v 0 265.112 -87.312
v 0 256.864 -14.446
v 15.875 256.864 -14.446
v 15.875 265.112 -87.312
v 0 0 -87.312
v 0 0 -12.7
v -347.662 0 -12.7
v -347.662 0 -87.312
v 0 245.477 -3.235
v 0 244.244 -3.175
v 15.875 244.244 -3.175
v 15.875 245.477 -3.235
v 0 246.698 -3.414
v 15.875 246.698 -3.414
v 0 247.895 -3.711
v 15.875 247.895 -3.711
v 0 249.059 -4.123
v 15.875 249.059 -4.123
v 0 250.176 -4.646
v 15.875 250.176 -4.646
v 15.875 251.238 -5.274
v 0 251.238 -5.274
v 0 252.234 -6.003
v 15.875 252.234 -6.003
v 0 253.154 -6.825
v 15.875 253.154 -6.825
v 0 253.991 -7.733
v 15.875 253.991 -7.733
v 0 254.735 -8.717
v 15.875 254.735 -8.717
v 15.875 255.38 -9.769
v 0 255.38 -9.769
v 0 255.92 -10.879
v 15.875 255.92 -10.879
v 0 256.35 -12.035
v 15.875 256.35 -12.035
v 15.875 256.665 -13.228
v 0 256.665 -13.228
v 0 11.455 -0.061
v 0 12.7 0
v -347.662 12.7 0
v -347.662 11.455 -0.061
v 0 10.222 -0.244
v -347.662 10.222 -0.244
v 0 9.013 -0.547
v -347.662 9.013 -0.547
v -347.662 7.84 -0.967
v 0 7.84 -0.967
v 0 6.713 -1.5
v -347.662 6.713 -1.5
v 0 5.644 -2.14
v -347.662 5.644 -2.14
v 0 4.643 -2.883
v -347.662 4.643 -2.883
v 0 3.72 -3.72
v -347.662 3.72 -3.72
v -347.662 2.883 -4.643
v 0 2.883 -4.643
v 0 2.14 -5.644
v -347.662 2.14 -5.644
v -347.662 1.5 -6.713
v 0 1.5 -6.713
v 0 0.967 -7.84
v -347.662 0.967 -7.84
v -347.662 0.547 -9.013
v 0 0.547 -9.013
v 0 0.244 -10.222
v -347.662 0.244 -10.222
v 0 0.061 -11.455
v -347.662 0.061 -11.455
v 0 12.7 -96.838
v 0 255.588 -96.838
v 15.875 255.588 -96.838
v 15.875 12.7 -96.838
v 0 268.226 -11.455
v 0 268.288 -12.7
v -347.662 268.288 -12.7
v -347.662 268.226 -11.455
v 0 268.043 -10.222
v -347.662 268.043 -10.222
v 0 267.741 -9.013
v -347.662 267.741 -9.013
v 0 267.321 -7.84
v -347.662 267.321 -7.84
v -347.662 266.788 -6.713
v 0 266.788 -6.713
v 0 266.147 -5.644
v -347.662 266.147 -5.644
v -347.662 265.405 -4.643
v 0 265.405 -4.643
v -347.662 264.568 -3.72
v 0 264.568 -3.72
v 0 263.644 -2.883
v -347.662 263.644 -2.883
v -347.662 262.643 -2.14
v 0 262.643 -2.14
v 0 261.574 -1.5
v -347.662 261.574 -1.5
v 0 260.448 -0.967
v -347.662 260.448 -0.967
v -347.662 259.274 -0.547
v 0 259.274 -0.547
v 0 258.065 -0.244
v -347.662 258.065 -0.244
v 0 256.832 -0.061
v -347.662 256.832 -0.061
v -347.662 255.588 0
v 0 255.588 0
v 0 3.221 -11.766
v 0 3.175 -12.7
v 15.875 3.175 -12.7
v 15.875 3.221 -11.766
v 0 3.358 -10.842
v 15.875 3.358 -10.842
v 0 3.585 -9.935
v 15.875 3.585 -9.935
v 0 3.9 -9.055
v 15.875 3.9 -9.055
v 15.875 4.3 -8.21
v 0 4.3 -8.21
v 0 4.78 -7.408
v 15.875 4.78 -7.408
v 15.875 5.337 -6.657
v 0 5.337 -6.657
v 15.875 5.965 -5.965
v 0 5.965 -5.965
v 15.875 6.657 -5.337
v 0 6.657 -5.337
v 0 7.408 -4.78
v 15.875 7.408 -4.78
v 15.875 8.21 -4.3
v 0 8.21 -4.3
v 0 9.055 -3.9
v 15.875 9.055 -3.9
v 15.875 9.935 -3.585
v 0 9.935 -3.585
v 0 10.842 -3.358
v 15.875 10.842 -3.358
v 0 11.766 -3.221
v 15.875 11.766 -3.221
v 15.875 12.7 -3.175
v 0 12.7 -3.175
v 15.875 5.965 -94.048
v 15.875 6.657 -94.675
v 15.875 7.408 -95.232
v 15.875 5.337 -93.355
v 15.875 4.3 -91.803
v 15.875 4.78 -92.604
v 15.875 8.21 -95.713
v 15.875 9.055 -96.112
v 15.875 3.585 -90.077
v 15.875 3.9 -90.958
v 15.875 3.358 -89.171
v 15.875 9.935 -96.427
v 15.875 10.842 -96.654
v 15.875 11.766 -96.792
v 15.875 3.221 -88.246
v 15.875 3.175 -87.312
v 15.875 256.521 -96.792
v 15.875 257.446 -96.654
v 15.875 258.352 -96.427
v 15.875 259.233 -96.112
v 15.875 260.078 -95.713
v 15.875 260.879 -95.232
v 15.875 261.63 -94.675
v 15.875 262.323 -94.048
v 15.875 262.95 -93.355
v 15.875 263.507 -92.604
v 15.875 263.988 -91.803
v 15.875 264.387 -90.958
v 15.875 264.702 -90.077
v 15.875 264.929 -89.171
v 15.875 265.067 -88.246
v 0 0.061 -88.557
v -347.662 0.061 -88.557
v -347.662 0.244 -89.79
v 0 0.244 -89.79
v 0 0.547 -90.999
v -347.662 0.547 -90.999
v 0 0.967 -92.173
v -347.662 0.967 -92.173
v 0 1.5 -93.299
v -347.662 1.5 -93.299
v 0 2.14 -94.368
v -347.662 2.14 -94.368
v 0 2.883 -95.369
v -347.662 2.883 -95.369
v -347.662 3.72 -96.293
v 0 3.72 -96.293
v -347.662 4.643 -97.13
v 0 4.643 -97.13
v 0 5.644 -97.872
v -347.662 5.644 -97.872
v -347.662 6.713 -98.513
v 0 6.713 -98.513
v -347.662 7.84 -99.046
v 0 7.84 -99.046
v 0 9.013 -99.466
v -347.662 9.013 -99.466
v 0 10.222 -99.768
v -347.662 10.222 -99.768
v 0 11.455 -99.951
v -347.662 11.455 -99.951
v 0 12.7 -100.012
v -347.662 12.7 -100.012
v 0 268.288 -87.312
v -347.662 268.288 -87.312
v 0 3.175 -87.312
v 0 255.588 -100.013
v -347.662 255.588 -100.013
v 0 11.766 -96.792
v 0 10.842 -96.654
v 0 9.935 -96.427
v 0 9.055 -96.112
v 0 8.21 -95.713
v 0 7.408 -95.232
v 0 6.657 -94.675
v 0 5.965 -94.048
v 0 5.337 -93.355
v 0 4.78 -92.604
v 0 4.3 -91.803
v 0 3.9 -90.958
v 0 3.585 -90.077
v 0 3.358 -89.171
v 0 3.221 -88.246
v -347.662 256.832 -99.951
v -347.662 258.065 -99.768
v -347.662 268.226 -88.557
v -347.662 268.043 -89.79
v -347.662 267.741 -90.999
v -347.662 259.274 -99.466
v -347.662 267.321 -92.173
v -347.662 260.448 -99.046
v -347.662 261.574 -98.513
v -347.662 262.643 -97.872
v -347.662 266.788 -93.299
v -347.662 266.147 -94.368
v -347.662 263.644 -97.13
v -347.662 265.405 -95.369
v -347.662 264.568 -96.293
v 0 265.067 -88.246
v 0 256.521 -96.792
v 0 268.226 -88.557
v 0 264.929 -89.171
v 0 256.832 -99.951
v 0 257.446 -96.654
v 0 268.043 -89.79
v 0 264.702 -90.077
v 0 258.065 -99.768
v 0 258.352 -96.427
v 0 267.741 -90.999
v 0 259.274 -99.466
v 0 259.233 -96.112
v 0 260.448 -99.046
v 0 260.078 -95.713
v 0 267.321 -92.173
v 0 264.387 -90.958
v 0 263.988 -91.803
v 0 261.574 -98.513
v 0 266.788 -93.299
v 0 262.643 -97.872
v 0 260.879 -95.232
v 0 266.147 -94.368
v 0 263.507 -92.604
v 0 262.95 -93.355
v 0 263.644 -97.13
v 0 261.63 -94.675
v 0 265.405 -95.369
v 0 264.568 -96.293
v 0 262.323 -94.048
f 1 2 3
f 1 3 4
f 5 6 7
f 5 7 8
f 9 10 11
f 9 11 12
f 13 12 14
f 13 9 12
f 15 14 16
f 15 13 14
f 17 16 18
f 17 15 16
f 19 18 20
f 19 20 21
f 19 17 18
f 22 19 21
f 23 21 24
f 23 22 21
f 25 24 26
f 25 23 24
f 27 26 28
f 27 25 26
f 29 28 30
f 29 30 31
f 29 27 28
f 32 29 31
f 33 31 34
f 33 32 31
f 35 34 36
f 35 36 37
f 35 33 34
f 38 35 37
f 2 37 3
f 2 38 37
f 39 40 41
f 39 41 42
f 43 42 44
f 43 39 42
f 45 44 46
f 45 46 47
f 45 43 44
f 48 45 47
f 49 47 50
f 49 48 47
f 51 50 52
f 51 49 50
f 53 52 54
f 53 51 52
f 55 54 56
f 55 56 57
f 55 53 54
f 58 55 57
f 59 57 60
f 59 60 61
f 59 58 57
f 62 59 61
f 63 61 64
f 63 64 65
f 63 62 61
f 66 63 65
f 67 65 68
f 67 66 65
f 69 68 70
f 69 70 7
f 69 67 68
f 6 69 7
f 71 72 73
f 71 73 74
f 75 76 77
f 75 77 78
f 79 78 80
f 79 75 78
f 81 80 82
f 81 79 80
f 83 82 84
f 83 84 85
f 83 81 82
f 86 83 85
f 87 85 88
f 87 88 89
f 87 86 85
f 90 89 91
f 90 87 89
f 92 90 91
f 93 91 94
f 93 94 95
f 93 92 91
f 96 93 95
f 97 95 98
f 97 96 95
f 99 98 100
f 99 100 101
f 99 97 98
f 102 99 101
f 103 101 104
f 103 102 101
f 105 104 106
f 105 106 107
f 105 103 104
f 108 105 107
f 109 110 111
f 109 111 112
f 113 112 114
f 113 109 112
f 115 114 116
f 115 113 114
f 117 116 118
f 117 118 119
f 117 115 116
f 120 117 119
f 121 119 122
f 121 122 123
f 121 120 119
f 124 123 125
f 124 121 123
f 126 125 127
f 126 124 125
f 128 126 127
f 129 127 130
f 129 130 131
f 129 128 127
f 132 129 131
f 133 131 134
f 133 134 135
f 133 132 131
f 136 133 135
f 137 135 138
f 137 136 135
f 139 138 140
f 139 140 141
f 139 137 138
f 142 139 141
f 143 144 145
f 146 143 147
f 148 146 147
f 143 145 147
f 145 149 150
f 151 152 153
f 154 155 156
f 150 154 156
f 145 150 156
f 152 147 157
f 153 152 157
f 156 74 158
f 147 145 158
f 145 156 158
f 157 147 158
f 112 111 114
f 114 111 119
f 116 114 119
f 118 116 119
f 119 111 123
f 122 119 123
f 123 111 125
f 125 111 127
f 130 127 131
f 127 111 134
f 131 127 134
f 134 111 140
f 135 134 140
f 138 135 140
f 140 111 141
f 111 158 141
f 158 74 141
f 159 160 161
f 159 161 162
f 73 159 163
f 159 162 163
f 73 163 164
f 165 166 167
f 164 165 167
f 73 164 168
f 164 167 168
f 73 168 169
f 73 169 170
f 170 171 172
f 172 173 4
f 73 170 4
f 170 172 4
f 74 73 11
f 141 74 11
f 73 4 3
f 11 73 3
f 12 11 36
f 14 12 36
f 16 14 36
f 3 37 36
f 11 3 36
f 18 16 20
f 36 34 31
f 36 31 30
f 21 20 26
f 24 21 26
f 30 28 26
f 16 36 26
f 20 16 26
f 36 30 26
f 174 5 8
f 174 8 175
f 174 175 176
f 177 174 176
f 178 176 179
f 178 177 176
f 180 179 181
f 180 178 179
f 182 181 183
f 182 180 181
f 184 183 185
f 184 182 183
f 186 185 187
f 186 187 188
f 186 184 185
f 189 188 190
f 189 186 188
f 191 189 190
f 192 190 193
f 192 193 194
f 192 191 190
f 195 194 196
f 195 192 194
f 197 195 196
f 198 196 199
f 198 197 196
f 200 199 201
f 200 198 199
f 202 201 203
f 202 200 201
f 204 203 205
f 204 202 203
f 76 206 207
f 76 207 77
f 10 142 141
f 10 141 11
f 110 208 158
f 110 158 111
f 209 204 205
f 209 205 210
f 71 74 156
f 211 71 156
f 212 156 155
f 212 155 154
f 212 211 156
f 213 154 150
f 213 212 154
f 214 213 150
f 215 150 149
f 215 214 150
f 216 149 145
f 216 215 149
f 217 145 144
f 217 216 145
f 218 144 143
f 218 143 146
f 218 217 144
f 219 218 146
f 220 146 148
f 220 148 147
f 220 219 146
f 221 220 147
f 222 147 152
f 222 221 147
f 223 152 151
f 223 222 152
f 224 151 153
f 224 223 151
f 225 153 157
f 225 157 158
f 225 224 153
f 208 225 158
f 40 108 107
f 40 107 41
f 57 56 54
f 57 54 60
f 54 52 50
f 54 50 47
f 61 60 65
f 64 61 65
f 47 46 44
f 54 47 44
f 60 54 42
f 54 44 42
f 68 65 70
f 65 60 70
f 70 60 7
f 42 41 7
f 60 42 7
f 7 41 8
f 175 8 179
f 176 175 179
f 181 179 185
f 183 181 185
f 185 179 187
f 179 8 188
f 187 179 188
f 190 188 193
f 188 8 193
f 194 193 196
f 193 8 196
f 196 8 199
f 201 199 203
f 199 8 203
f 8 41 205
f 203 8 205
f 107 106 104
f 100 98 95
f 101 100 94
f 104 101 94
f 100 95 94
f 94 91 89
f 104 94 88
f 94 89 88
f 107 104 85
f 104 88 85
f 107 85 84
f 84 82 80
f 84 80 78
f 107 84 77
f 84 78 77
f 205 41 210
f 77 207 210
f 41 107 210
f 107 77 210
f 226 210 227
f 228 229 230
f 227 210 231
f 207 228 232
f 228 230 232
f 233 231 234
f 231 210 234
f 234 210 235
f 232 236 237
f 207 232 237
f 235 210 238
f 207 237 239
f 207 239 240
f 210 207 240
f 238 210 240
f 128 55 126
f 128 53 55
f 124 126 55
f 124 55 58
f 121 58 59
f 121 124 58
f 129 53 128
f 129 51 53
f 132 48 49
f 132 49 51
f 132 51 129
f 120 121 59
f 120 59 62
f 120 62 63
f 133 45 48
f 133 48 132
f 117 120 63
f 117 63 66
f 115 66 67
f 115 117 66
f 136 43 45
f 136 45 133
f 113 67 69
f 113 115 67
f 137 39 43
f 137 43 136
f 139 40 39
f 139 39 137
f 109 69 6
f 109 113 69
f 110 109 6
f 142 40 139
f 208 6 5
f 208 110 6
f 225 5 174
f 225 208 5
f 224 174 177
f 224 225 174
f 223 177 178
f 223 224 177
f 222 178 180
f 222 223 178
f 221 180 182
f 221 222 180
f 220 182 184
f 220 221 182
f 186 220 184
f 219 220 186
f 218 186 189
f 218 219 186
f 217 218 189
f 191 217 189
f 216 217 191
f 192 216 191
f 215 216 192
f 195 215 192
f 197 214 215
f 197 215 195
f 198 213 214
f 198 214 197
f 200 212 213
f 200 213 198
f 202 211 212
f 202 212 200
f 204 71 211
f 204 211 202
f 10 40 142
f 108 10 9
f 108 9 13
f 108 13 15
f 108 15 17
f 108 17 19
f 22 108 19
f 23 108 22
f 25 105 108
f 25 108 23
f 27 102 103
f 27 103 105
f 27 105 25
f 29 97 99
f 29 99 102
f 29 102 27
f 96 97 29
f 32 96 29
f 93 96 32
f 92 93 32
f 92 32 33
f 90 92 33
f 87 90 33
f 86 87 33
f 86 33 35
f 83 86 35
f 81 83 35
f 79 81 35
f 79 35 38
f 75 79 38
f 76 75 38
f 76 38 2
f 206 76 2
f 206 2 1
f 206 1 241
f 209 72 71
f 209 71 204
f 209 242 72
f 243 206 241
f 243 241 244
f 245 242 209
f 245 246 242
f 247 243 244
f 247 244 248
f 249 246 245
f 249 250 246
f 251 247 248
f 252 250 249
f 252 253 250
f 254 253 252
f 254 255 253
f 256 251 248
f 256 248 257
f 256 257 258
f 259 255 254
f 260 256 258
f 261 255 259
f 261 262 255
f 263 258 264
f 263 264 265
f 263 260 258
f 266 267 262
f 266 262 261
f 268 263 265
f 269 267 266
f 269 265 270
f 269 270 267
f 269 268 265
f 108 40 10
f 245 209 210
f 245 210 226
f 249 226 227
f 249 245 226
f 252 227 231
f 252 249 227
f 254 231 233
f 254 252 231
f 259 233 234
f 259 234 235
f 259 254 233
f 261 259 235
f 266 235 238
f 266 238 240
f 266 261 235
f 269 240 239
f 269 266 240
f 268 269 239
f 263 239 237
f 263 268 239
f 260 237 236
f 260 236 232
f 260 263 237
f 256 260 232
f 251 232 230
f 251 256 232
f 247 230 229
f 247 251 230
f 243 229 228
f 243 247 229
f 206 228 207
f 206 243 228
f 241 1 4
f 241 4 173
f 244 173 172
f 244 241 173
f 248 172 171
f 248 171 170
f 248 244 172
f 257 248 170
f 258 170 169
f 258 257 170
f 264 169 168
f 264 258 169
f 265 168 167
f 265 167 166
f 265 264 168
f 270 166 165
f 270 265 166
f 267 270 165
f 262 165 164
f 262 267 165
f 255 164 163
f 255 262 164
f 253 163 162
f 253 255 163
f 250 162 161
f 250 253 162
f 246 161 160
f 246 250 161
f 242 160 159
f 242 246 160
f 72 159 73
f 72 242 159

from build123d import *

# Parameters (mm, degrees)
BOSS_EXTRUDE1_DEPTH = 347.6625
BOSS_EXTRUDE2_DEPTH = 15.875


with BuildPart() as part:
    # Sketch1 → Boss-Extrude1 (new body)
    with BuildSketch(Plane(origin=(0, 0, 0), x_dir=(0, 0, -1), z_dir=(1, 0, 0))):
        with BuildLine():
            Line((12.7, 0), (87.3125, 0))
            ThreePointArc((87.3125, 0), (96.292756121, 3.719743879), (100.0125, 12.7))
            Line((100.0125, 12.7), (100.0125, 255.5875))
            ThreePointArc((100.0125, 255.5875), (96.292756121, 264.567756121), (87.3125, 268.2875))
            Line((87.3125, 268.2875), (12.7, 268.2875))
            ThreePointArc((12.7, 268.2875), (3.719743879, 264.567756121), (0, 255.5875))
            Line((0, 255.5875), (0, 12.7))
            ThreePointArc((0, 12.7), (3.719743879, 3.719743879), (12.7, 0))
        make_face()
    extrude(amount=-BOSS_EXTRUDE1_DEPTH)

    # Sketch2 → Boss-Extrude2 (add)
    with BuildSketch(Plane(origin=(0, 0, 0), x_dir=(0, 0, -1), z_dir=(1, 0, 0))):
        with BuildLine():
            Line((14.446389506, 256.863506359), (87.3125, 265.1125))
            ThreePointArc((87.3125, 265.1125), (94.047692091, 262.322692091), (96.8375, 255.5875))
            Line((96.8375, 255.5875), (96.8375, 12.7))
            ThreePointArc((96.8375, 12.7), (94.047692091, 5.964807909), (87.3125, 3.175))
            Line((87.3125, 3.175), (12.7, 3.175))
            ThreePointArc((12.7, 3.175), (5.964807909, 5.964807909), (3.175, 12.7))
            Line((3.175, 12.7), (3.175, 244.244113662))
            ThreePointArc((3.175, 244.244113662), (6.403111242, 252.704215515), (14.446389506, 256.863506359))
        make_face()
    extrude(amount=BOSS_EXTRUDE2_DEPTH)


solid = part.part
